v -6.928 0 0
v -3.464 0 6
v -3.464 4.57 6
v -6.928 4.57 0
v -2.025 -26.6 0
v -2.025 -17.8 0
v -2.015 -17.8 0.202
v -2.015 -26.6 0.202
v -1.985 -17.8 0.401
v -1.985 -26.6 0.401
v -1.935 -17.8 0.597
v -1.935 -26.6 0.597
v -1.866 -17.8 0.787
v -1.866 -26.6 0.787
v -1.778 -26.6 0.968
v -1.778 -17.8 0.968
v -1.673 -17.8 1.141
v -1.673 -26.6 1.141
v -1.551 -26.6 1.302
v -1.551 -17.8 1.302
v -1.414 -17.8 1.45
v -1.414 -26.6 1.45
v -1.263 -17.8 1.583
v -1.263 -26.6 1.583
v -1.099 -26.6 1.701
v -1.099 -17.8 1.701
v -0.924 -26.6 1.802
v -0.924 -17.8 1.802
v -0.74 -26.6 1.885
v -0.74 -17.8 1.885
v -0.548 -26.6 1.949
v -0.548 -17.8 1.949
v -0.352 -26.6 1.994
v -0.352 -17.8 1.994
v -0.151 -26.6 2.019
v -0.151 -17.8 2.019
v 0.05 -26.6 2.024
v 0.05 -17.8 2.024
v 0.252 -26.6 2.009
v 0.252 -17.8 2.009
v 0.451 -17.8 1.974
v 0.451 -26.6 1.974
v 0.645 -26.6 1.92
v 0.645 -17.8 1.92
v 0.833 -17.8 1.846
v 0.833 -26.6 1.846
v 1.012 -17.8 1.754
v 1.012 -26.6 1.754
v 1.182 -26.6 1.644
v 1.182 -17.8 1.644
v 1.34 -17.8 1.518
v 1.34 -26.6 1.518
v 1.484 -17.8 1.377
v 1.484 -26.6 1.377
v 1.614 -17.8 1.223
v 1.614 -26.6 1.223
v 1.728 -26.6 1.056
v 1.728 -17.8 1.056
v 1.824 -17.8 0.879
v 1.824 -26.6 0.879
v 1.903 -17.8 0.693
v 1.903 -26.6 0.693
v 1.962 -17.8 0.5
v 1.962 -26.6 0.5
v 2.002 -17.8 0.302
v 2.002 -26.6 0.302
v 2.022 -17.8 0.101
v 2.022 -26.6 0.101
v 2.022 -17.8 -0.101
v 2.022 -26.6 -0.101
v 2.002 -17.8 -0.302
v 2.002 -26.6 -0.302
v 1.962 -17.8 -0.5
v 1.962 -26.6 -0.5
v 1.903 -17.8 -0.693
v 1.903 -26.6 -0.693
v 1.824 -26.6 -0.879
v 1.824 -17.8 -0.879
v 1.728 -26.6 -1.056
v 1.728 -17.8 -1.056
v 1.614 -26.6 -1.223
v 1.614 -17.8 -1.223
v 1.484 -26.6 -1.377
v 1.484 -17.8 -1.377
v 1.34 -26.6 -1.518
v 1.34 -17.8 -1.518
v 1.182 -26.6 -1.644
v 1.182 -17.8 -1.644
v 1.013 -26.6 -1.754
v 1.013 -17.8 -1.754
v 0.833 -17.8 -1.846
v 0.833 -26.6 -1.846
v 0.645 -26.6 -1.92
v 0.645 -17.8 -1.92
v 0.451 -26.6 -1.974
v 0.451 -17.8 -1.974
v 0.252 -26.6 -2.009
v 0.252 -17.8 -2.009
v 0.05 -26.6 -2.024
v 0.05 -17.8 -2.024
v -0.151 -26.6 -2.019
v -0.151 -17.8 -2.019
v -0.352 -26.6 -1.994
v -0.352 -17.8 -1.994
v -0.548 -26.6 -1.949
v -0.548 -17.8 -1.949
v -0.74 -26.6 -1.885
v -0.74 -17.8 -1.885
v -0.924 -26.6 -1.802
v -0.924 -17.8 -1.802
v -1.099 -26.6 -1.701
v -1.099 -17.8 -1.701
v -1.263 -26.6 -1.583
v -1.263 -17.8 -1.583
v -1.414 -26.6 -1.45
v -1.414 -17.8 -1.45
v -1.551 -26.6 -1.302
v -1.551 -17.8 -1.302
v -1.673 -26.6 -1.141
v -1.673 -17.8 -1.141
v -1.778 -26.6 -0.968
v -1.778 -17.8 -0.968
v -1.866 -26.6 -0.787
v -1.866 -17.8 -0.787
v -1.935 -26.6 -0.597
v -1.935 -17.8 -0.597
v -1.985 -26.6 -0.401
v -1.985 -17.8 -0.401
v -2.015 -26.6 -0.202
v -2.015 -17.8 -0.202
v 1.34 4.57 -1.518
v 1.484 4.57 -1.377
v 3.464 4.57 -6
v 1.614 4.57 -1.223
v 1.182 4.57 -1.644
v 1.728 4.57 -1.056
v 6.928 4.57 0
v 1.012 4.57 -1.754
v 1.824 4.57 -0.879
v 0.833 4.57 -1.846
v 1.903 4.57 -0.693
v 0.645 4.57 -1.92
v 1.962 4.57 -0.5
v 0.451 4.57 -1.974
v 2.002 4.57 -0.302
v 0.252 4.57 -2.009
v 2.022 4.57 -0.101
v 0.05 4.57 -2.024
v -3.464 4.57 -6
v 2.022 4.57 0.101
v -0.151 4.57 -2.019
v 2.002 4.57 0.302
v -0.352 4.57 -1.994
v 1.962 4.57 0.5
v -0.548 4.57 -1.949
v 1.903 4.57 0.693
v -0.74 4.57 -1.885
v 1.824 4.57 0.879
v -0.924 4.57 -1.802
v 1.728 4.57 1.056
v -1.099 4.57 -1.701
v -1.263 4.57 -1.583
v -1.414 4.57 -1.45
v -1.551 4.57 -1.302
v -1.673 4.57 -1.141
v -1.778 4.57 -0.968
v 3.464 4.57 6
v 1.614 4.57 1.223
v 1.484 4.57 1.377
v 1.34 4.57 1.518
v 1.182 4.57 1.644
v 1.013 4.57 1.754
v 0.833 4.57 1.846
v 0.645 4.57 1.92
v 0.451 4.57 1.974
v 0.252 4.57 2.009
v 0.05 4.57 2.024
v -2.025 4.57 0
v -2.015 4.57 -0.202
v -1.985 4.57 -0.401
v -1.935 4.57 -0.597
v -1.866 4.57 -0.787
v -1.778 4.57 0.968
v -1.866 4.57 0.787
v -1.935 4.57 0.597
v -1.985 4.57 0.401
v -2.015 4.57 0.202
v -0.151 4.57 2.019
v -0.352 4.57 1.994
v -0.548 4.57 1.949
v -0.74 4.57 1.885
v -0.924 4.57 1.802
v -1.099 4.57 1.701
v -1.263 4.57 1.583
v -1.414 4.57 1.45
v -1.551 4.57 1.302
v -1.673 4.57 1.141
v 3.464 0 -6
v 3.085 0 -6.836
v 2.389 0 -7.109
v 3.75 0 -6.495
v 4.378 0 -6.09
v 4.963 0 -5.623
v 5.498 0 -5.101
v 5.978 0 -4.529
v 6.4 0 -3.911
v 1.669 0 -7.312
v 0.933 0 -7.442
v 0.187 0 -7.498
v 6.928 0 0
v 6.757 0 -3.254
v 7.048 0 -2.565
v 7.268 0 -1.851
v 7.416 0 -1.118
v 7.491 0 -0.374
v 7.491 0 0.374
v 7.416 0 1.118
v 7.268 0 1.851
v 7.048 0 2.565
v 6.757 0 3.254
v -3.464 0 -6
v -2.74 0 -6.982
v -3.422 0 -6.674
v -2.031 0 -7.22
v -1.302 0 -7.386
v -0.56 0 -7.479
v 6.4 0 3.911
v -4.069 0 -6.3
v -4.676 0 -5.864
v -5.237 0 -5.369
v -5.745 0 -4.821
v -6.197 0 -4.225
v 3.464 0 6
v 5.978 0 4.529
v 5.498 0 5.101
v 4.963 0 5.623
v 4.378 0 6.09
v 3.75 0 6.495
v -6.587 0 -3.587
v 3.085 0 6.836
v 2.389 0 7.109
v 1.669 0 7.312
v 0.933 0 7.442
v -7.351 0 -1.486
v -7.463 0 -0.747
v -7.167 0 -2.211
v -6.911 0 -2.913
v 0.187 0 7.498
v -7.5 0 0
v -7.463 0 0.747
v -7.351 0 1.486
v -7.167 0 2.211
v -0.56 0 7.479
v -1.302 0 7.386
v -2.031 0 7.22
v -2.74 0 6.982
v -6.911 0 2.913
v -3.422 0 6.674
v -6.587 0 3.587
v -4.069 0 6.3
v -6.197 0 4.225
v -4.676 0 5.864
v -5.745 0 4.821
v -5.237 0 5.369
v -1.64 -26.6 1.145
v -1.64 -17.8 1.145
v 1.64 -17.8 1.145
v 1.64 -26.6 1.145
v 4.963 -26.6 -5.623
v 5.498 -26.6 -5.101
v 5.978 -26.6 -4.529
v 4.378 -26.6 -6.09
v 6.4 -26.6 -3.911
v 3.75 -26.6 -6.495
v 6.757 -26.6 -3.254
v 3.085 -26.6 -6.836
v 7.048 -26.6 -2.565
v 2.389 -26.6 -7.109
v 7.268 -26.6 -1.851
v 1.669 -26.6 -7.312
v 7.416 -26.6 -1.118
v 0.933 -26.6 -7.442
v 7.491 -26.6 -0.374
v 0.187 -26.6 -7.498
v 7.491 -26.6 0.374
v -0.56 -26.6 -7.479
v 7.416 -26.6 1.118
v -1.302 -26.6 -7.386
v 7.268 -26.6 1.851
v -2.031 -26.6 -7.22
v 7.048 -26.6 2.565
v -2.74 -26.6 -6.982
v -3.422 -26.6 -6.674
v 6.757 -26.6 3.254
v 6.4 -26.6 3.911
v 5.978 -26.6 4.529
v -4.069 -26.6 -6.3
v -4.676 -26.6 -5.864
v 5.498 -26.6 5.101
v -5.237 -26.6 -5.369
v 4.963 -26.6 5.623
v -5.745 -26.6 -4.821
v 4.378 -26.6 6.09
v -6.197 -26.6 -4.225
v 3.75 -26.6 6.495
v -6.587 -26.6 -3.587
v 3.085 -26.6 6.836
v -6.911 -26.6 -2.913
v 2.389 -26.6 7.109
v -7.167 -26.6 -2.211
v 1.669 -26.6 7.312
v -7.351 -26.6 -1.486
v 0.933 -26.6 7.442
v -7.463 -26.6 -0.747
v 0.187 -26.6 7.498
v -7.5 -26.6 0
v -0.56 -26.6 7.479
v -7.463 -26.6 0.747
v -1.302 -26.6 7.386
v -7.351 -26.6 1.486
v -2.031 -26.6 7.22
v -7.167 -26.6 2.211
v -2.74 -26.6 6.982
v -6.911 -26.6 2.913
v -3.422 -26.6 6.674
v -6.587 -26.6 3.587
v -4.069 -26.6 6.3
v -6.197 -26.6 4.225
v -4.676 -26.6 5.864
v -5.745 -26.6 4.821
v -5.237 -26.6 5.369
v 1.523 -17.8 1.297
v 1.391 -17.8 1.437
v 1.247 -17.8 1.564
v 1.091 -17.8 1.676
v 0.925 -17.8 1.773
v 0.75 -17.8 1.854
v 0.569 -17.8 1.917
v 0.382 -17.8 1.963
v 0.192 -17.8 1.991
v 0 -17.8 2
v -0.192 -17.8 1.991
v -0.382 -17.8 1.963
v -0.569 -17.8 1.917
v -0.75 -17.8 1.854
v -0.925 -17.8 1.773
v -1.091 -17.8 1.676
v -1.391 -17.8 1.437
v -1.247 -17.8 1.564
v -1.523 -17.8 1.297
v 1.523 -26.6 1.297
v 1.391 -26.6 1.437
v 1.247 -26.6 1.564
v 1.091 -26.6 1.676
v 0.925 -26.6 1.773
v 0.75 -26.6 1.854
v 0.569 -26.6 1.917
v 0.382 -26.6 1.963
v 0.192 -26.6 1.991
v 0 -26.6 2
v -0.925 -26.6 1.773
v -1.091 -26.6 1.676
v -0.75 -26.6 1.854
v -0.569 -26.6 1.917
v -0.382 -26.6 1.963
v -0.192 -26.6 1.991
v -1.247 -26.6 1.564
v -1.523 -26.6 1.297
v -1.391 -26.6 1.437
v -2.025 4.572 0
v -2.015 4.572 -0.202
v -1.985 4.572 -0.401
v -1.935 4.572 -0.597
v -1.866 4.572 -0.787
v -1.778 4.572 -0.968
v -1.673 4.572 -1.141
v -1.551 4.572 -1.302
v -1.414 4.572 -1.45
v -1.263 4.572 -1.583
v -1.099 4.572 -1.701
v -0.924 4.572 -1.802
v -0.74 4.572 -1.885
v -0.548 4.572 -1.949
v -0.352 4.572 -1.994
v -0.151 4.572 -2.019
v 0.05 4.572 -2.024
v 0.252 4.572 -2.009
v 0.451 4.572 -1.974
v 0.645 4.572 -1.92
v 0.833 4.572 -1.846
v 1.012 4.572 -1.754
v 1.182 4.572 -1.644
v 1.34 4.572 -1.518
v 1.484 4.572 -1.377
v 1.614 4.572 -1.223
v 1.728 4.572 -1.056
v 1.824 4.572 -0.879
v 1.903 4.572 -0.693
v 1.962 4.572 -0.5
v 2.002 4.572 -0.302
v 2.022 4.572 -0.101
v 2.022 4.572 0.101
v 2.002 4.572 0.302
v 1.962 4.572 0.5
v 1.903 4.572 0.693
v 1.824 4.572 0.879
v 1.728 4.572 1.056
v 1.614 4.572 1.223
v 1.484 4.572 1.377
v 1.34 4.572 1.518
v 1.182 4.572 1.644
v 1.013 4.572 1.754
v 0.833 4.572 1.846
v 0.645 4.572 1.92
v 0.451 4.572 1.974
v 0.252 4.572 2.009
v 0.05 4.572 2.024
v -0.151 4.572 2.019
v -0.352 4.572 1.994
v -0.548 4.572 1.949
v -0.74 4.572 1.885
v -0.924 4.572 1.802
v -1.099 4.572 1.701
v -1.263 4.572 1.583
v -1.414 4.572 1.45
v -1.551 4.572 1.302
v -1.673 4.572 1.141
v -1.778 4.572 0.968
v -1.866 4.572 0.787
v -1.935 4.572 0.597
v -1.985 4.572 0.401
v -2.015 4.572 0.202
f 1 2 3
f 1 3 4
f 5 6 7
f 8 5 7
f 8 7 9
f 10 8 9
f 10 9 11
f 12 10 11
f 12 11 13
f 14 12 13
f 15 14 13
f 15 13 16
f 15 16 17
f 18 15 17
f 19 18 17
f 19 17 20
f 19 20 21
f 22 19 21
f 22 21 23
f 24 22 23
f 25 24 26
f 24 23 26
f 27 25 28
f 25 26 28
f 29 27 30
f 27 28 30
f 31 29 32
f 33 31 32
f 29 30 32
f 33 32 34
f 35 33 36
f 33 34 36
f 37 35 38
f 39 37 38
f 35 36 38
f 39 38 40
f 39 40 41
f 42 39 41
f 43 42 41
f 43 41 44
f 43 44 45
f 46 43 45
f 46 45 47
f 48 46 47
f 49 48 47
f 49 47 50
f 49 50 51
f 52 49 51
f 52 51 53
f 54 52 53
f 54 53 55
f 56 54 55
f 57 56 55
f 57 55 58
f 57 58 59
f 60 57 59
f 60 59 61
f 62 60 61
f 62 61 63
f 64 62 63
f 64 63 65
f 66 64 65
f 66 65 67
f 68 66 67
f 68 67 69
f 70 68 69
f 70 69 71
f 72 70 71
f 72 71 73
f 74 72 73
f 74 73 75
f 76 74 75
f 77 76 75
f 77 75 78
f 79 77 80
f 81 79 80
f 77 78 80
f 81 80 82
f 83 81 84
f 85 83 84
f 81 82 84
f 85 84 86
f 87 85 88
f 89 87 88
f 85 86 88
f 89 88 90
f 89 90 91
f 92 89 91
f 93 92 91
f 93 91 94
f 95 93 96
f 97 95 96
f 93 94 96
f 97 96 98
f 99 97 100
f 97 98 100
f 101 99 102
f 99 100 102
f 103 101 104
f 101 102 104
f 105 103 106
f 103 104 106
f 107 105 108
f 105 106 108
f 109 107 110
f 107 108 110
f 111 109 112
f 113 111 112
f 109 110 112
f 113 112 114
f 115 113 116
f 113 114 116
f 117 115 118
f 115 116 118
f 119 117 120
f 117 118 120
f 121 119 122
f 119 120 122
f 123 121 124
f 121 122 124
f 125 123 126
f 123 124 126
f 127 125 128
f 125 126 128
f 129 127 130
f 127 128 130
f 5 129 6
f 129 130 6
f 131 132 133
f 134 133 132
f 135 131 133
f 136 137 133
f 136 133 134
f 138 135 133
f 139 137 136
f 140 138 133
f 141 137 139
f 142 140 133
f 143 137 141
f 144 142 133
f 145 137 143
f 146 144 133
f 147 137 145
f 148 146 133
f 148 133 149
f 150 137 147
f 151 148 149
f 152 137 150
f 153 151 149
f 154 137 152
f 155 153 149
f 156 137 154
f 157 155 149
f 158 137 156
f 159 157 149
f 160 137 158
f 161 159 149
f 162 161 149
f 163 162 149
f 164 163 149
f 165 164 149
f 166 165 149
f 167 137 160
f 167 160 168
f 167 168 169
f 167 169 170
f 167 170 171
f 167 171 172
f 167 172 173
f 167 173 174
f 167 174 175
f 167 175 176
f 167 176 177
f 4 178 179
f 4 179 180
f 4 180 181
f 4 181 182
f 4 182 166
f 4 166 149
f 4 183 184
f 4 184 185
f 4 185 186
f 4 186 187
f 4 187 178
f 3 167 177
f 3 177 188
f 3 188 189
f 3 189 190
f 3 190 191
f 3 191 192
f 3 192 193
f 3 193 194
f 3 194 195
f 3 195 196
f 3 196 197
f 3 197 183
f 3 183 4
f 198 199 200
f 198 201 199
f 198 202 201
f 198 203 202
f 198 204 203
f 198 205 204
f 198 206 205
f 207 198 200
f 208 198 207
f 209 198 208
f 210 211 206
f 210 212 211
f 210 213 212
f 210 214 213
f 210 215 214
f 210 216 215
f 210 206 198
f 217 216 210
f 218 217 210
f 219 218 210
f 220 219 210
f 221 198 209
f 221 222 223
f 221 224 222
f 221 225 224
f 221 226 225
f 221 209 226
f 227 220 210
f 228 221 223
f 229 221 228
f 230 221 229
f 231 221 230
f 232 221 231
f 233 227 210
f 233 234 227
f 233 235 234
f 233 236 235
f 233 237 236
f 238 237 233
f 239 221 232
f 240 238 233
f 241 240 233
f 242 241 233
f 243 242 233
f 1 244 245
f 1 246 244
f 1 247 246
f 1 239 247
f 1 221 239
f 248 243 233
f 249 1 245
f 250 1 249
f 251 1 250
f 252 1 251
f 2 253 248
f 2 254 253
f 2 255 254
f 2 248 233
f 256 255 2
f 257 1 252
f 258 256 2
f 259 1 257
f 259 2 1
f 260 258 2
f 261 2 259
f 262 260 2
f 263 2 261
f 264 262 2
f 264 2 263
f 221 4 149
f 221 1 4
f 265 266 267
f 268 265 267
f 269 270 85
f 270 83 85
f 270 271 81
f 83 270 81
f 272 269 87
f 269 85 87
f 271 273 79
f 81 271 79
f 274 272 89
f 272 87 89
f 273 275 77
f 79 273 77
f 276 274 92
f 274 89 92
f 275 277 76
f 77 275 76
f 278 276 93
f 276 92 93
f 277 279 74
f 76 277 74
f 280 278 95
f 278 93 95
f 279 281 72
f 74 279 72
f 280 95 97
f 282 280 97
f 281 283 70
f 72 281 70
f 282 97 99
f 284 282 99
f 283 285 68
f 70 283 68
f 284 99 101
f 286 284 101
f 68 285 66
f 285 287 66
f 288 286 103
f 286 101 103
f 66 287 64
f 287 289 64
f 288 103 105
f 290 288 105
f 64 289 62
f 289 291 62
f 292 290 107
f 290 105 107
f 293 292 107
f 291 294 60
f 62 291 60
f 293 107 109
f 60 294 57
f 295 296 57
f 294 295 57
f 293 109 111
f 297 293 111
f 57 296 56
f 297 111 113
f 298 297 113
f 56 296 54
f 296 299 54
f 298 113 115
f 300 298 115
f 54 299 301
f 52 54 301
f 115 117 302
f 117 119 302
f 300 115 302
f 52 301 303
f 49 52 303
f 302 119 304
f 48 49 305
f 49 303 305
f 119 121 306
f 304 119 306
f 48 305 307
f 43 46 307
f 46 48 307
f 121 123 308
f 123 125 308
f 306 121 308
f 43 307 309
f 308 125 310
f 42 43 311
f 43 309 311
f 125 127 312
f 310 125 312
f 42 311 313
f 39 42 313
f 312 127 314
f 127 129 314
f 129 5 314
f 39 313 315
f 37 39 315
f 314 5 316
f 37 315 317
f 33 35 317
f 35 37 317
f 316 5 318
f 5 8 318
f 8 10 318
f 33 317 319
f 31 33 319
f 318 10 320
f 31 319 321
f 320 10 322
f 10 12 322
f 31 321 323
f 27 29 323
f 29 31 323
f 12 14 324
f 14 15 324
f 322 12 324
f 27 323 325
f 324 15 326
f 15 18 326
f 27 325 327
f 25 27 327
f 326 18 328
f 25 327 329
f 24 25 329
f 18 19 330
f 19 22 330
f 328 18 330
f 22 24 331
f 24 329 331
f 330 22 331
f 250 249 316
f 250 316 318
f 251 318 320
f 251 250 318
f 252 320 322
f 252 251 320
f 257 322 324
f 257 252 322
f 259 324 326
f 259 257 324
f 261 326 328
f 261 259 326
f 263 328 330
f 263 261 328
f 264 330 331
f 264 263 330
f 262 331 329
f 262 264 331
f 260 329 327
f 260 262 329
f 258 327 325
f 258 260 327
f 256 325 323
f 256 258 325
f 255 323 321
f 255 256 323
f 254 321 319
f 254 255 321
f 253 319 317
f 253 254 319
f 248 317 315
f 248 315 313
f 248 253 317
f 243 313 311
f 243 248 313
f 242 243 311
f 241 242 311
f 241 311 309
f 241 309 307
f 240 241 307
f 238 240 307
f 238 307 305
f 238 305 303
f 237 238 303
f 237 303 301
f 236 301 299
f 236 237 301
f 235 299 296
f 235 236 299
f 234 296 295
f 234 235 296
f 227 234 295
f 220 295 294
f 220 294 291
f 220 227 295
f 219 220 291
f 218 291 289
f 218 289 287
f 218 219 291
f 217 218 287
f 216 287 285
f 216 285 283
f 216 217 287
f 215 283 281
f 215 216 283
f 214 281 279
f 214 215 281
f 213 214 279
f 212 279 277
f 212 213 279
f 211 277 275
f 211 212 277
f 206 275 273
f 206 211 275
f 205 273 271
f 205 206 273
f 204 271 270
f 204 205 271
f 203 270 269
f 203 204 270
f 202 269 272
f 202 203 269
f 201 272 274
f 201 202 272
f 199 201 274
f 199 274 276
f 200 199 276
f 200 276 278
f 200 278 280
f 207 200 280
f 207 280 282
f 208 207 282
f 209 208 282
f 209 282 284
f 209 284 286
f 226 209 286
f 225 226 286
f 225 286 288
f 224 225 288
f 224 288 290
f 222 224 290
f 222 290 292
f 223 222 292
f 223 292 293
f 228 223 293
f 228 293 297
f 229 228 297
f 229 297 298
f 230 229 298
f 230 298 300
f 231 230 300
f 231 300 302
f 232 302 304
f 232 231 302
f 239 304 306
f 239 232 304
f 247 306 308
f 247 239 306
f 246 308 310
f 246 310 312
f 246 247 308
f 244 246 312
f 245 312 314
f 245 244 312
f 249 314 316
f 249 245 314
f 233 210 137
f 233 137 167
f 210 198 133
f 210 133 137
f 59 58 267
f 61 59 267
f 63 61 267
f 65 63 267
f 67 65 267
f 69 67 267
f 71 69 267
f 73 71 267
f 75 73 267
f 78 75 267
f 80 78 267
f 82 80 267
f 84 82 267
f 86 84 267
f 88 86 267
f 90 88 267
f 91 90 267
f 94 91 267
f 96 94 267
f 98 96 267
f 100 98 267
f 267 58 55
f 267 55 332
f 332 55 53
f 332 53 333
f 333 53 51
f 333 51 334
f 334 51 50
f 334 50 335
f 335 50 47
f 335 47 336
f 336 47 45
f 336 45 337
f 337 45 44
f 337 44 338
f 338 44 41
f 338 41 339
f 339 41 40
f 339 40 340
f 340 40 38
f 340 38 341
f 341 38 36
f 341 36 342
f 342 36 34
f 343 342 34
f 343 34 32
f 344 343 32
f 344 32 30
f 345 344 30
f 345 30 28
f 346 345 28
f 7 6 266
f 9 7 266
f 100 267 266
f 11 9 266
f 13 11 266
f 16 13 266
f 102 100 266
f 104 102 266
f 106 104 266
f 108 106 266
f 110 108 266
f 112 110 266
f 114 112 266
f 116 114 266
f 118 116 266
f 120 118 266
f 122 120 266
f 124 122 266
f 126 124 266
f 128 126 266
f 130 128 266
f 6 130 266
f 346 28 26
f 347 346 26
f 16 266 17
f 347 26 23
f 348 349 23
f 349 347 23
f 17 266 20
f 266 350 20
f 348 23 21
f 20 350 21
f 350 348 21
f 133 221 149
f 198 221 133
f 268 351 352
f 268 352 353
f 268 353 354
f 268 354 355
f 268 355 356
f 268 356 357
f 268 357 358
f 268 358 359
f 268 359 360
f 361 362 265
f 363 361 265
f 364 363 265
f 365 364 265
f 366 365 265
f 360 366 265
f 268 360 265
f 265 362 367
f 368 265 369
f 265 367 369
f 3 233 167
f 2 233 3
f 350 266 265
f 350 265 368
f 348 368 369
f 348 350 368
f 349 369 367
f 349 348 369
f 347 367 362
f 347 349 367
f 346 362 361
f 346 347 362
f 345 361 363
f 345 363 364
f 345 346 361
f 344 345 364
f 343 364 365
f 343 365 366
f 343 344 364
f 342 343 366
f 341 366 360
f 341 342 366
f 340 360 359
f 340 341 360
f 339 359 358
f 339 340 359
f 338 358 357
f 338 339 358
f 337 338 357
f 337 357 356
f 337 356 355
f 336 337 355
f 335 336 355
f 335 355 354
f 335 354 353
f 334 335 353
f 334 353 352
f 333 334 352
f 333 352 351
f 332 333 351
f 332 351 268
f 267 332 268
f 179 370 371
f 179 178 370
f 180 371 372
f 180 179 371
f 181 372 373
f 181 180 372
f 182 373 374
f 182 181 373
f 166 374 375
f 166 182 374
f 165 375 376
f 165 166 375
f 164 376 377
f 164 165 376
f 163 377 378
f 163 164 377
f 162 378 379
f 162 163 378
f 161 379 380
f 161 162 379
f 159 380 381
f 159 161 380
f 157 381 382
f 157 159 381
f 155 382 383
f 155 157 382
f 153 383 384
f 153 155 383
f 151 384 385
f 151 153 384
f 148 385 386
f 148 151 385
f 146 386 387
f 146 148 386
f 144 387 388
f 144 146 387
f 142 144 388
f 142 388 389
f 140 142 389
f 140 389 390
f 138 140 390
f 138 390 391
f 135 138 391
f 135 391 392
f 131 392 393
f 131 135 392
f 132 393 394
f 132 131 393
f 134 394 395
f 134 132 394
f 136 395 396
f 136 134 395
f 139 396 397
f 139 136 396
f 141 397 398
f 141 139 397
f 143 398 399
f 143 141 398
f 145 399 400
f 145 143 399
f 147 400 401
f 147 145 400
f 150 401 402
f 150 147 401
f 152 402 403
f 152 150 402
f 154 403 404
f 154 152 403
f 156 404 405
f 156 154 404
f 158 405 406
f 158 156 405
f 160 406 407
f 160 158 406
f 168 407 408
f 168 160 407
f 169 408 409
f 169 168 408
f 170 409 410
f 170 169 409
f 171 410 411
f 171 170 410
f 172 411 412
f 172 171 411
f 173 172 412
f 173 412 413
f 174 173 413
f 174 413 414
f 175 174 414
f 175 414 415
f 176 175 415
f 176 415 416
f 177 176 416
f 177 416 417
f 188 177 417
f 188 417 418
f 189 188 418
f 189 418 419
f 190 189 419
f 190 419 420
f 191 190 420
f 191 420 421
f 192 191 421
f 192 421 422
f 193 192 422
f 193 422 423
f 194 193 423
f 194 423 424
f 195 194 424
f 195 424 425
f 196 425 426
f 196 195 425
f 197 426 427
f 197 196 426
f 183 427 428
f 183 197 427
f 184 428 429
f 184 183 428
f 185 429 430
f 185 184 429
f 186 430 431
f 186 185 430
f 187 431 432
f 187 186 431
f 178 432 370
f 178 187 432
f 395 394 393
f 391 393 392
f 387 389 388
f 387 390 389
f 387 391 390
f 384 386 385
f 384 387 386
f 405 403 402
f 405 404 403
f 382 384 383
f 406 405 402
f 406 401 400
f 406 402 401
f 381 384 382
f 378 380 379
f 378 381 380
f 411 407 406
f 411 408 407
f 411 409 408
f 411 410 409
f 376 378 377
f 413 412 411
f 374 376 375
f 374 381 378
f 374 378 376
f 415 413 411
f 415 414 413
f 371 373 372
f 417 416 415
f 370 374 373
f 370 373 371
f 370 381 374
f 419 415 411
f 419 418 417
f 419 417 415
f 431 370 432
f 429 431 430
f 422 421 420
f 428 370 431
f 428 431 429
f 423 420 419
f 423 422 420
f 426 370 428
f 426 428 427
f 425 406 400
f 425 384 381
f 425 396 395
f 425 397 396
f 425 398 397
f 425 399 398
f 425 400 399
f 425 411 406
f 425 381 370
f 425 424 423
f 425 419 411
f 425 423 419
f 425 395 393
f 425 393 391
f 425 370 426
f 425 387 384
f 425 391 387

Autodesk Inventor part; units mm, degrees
ref_plane "YZ Plane" through (0, 0, 0) normal (1, 0, 0) x (0, 1, 0)
ref_plane "XZ Plane" through (0, 0, 0) normal (0, 1, 0) x (-1, 0, 0)
ref_plane "XY Plane" through (0, 0, 0) normal (0, 0, 1) x (1, 0, 0)
sketch "Sketch1" plane through (0, 0, 0) normal (0, 1, 0) x (-1, 0, 0)
  line L0 (-3.4641, -6) -> (-6.9282, 0)
  line L1 (-6.9282, 0) -> (-3.4641, 6)
  line L2 (-3.4641, 6) -> (3.4641, 6)
  line L3 (3.4641, 6) -> (6.9282, 0)
  line L4 (6.9282, 0) -> (3.4641, -6)
  line L5 (3.4641, -6) -> (-3.4641, -6)
  line L6 (10.5, 0) -> (-10.5, 0) projected
  line L7 (0, -10.5) -> (0, 10.5) projected
  circle A0 centre (0, 0) radius 2
  arc A1 (0.4459, -1.9497) -> (0.4459, -1.9497) centre (0, 0) ccw
  line L8 (1.64, 1.1447) -> (-1.64, 1.1447)
  circle A2 centre (0, 0) radius 2.025
  circle A3 centre (0, 0) radius 7.5
  dimension "d2" = 4
  dimension "d6" = 4.05
  dimension "d33" = 15
  dimension "d36" = 3.28
  dimension "d37" = 12
extrude "Extrusion1" add sketch "Sketch1" along normal blind 4.57 contours L0 L6 A2 L7 L5 | L1 L2 L7 A2 L6 | L7 A2 L6 L4 L5 | L6 A0 L7 A2 | L7 A0 L6 A2 | L2 L3 L6 A2 L7 picked at (-1.8669, -0.7323) picked at (1.9162, -0.5914)
extrude "Extrusion6" add sketch "Sketch1" along normal blind 4.572 contours A2 L7 A0 L6 | L6 A0 L7 A2 | L7 A0 L6 A2 | A0 L8 L7 L6 | L6 L7 A0 | A2 L6 A0 L7 | L7 L6 A0 | L7 L8 A0 L6 | A0 L7 L8 | A0 L8 L7
extrude "Extrusion11" add sketch "Sketch1" against normal blind 17.8 contours A2 L7 A0 L6 | L6 A0 L7 A2 | L7 A0 L6 A2 | A0 L8 L7 L6 | L6 L7 A0 | A2 L6 A0 L7 | L7 L6 A0 | L7 L8 A0 L6 | A0 L7 L8 | A0 L8 L7
extrude "Extrusion12" add sketch "Sketch1" against normal blind 26.6 contours A2 L7 A0 L6 | A2 L6 A0 L7 | A0 L7 L8 | A0 L8 L7 picked at (-1.5145, 1.3032) picked at (1.5145, 1.3032)
extrude "Extrusion13" add sketch "Sketch1" against normal blind 26.6 contours L5 L7 A3 L6 L0 | L0 L6 A2 L7 L5 | L6 A3 L7 L2 L1 | L1 L2 L7 A2 L6 | L7 A2 L6 L4 L5 | L5 L4 L6 A3 L7 | L7 A3 L6 L3 L2 | L2 L3 L6 A2 L7
properties part number "wheel connector"
